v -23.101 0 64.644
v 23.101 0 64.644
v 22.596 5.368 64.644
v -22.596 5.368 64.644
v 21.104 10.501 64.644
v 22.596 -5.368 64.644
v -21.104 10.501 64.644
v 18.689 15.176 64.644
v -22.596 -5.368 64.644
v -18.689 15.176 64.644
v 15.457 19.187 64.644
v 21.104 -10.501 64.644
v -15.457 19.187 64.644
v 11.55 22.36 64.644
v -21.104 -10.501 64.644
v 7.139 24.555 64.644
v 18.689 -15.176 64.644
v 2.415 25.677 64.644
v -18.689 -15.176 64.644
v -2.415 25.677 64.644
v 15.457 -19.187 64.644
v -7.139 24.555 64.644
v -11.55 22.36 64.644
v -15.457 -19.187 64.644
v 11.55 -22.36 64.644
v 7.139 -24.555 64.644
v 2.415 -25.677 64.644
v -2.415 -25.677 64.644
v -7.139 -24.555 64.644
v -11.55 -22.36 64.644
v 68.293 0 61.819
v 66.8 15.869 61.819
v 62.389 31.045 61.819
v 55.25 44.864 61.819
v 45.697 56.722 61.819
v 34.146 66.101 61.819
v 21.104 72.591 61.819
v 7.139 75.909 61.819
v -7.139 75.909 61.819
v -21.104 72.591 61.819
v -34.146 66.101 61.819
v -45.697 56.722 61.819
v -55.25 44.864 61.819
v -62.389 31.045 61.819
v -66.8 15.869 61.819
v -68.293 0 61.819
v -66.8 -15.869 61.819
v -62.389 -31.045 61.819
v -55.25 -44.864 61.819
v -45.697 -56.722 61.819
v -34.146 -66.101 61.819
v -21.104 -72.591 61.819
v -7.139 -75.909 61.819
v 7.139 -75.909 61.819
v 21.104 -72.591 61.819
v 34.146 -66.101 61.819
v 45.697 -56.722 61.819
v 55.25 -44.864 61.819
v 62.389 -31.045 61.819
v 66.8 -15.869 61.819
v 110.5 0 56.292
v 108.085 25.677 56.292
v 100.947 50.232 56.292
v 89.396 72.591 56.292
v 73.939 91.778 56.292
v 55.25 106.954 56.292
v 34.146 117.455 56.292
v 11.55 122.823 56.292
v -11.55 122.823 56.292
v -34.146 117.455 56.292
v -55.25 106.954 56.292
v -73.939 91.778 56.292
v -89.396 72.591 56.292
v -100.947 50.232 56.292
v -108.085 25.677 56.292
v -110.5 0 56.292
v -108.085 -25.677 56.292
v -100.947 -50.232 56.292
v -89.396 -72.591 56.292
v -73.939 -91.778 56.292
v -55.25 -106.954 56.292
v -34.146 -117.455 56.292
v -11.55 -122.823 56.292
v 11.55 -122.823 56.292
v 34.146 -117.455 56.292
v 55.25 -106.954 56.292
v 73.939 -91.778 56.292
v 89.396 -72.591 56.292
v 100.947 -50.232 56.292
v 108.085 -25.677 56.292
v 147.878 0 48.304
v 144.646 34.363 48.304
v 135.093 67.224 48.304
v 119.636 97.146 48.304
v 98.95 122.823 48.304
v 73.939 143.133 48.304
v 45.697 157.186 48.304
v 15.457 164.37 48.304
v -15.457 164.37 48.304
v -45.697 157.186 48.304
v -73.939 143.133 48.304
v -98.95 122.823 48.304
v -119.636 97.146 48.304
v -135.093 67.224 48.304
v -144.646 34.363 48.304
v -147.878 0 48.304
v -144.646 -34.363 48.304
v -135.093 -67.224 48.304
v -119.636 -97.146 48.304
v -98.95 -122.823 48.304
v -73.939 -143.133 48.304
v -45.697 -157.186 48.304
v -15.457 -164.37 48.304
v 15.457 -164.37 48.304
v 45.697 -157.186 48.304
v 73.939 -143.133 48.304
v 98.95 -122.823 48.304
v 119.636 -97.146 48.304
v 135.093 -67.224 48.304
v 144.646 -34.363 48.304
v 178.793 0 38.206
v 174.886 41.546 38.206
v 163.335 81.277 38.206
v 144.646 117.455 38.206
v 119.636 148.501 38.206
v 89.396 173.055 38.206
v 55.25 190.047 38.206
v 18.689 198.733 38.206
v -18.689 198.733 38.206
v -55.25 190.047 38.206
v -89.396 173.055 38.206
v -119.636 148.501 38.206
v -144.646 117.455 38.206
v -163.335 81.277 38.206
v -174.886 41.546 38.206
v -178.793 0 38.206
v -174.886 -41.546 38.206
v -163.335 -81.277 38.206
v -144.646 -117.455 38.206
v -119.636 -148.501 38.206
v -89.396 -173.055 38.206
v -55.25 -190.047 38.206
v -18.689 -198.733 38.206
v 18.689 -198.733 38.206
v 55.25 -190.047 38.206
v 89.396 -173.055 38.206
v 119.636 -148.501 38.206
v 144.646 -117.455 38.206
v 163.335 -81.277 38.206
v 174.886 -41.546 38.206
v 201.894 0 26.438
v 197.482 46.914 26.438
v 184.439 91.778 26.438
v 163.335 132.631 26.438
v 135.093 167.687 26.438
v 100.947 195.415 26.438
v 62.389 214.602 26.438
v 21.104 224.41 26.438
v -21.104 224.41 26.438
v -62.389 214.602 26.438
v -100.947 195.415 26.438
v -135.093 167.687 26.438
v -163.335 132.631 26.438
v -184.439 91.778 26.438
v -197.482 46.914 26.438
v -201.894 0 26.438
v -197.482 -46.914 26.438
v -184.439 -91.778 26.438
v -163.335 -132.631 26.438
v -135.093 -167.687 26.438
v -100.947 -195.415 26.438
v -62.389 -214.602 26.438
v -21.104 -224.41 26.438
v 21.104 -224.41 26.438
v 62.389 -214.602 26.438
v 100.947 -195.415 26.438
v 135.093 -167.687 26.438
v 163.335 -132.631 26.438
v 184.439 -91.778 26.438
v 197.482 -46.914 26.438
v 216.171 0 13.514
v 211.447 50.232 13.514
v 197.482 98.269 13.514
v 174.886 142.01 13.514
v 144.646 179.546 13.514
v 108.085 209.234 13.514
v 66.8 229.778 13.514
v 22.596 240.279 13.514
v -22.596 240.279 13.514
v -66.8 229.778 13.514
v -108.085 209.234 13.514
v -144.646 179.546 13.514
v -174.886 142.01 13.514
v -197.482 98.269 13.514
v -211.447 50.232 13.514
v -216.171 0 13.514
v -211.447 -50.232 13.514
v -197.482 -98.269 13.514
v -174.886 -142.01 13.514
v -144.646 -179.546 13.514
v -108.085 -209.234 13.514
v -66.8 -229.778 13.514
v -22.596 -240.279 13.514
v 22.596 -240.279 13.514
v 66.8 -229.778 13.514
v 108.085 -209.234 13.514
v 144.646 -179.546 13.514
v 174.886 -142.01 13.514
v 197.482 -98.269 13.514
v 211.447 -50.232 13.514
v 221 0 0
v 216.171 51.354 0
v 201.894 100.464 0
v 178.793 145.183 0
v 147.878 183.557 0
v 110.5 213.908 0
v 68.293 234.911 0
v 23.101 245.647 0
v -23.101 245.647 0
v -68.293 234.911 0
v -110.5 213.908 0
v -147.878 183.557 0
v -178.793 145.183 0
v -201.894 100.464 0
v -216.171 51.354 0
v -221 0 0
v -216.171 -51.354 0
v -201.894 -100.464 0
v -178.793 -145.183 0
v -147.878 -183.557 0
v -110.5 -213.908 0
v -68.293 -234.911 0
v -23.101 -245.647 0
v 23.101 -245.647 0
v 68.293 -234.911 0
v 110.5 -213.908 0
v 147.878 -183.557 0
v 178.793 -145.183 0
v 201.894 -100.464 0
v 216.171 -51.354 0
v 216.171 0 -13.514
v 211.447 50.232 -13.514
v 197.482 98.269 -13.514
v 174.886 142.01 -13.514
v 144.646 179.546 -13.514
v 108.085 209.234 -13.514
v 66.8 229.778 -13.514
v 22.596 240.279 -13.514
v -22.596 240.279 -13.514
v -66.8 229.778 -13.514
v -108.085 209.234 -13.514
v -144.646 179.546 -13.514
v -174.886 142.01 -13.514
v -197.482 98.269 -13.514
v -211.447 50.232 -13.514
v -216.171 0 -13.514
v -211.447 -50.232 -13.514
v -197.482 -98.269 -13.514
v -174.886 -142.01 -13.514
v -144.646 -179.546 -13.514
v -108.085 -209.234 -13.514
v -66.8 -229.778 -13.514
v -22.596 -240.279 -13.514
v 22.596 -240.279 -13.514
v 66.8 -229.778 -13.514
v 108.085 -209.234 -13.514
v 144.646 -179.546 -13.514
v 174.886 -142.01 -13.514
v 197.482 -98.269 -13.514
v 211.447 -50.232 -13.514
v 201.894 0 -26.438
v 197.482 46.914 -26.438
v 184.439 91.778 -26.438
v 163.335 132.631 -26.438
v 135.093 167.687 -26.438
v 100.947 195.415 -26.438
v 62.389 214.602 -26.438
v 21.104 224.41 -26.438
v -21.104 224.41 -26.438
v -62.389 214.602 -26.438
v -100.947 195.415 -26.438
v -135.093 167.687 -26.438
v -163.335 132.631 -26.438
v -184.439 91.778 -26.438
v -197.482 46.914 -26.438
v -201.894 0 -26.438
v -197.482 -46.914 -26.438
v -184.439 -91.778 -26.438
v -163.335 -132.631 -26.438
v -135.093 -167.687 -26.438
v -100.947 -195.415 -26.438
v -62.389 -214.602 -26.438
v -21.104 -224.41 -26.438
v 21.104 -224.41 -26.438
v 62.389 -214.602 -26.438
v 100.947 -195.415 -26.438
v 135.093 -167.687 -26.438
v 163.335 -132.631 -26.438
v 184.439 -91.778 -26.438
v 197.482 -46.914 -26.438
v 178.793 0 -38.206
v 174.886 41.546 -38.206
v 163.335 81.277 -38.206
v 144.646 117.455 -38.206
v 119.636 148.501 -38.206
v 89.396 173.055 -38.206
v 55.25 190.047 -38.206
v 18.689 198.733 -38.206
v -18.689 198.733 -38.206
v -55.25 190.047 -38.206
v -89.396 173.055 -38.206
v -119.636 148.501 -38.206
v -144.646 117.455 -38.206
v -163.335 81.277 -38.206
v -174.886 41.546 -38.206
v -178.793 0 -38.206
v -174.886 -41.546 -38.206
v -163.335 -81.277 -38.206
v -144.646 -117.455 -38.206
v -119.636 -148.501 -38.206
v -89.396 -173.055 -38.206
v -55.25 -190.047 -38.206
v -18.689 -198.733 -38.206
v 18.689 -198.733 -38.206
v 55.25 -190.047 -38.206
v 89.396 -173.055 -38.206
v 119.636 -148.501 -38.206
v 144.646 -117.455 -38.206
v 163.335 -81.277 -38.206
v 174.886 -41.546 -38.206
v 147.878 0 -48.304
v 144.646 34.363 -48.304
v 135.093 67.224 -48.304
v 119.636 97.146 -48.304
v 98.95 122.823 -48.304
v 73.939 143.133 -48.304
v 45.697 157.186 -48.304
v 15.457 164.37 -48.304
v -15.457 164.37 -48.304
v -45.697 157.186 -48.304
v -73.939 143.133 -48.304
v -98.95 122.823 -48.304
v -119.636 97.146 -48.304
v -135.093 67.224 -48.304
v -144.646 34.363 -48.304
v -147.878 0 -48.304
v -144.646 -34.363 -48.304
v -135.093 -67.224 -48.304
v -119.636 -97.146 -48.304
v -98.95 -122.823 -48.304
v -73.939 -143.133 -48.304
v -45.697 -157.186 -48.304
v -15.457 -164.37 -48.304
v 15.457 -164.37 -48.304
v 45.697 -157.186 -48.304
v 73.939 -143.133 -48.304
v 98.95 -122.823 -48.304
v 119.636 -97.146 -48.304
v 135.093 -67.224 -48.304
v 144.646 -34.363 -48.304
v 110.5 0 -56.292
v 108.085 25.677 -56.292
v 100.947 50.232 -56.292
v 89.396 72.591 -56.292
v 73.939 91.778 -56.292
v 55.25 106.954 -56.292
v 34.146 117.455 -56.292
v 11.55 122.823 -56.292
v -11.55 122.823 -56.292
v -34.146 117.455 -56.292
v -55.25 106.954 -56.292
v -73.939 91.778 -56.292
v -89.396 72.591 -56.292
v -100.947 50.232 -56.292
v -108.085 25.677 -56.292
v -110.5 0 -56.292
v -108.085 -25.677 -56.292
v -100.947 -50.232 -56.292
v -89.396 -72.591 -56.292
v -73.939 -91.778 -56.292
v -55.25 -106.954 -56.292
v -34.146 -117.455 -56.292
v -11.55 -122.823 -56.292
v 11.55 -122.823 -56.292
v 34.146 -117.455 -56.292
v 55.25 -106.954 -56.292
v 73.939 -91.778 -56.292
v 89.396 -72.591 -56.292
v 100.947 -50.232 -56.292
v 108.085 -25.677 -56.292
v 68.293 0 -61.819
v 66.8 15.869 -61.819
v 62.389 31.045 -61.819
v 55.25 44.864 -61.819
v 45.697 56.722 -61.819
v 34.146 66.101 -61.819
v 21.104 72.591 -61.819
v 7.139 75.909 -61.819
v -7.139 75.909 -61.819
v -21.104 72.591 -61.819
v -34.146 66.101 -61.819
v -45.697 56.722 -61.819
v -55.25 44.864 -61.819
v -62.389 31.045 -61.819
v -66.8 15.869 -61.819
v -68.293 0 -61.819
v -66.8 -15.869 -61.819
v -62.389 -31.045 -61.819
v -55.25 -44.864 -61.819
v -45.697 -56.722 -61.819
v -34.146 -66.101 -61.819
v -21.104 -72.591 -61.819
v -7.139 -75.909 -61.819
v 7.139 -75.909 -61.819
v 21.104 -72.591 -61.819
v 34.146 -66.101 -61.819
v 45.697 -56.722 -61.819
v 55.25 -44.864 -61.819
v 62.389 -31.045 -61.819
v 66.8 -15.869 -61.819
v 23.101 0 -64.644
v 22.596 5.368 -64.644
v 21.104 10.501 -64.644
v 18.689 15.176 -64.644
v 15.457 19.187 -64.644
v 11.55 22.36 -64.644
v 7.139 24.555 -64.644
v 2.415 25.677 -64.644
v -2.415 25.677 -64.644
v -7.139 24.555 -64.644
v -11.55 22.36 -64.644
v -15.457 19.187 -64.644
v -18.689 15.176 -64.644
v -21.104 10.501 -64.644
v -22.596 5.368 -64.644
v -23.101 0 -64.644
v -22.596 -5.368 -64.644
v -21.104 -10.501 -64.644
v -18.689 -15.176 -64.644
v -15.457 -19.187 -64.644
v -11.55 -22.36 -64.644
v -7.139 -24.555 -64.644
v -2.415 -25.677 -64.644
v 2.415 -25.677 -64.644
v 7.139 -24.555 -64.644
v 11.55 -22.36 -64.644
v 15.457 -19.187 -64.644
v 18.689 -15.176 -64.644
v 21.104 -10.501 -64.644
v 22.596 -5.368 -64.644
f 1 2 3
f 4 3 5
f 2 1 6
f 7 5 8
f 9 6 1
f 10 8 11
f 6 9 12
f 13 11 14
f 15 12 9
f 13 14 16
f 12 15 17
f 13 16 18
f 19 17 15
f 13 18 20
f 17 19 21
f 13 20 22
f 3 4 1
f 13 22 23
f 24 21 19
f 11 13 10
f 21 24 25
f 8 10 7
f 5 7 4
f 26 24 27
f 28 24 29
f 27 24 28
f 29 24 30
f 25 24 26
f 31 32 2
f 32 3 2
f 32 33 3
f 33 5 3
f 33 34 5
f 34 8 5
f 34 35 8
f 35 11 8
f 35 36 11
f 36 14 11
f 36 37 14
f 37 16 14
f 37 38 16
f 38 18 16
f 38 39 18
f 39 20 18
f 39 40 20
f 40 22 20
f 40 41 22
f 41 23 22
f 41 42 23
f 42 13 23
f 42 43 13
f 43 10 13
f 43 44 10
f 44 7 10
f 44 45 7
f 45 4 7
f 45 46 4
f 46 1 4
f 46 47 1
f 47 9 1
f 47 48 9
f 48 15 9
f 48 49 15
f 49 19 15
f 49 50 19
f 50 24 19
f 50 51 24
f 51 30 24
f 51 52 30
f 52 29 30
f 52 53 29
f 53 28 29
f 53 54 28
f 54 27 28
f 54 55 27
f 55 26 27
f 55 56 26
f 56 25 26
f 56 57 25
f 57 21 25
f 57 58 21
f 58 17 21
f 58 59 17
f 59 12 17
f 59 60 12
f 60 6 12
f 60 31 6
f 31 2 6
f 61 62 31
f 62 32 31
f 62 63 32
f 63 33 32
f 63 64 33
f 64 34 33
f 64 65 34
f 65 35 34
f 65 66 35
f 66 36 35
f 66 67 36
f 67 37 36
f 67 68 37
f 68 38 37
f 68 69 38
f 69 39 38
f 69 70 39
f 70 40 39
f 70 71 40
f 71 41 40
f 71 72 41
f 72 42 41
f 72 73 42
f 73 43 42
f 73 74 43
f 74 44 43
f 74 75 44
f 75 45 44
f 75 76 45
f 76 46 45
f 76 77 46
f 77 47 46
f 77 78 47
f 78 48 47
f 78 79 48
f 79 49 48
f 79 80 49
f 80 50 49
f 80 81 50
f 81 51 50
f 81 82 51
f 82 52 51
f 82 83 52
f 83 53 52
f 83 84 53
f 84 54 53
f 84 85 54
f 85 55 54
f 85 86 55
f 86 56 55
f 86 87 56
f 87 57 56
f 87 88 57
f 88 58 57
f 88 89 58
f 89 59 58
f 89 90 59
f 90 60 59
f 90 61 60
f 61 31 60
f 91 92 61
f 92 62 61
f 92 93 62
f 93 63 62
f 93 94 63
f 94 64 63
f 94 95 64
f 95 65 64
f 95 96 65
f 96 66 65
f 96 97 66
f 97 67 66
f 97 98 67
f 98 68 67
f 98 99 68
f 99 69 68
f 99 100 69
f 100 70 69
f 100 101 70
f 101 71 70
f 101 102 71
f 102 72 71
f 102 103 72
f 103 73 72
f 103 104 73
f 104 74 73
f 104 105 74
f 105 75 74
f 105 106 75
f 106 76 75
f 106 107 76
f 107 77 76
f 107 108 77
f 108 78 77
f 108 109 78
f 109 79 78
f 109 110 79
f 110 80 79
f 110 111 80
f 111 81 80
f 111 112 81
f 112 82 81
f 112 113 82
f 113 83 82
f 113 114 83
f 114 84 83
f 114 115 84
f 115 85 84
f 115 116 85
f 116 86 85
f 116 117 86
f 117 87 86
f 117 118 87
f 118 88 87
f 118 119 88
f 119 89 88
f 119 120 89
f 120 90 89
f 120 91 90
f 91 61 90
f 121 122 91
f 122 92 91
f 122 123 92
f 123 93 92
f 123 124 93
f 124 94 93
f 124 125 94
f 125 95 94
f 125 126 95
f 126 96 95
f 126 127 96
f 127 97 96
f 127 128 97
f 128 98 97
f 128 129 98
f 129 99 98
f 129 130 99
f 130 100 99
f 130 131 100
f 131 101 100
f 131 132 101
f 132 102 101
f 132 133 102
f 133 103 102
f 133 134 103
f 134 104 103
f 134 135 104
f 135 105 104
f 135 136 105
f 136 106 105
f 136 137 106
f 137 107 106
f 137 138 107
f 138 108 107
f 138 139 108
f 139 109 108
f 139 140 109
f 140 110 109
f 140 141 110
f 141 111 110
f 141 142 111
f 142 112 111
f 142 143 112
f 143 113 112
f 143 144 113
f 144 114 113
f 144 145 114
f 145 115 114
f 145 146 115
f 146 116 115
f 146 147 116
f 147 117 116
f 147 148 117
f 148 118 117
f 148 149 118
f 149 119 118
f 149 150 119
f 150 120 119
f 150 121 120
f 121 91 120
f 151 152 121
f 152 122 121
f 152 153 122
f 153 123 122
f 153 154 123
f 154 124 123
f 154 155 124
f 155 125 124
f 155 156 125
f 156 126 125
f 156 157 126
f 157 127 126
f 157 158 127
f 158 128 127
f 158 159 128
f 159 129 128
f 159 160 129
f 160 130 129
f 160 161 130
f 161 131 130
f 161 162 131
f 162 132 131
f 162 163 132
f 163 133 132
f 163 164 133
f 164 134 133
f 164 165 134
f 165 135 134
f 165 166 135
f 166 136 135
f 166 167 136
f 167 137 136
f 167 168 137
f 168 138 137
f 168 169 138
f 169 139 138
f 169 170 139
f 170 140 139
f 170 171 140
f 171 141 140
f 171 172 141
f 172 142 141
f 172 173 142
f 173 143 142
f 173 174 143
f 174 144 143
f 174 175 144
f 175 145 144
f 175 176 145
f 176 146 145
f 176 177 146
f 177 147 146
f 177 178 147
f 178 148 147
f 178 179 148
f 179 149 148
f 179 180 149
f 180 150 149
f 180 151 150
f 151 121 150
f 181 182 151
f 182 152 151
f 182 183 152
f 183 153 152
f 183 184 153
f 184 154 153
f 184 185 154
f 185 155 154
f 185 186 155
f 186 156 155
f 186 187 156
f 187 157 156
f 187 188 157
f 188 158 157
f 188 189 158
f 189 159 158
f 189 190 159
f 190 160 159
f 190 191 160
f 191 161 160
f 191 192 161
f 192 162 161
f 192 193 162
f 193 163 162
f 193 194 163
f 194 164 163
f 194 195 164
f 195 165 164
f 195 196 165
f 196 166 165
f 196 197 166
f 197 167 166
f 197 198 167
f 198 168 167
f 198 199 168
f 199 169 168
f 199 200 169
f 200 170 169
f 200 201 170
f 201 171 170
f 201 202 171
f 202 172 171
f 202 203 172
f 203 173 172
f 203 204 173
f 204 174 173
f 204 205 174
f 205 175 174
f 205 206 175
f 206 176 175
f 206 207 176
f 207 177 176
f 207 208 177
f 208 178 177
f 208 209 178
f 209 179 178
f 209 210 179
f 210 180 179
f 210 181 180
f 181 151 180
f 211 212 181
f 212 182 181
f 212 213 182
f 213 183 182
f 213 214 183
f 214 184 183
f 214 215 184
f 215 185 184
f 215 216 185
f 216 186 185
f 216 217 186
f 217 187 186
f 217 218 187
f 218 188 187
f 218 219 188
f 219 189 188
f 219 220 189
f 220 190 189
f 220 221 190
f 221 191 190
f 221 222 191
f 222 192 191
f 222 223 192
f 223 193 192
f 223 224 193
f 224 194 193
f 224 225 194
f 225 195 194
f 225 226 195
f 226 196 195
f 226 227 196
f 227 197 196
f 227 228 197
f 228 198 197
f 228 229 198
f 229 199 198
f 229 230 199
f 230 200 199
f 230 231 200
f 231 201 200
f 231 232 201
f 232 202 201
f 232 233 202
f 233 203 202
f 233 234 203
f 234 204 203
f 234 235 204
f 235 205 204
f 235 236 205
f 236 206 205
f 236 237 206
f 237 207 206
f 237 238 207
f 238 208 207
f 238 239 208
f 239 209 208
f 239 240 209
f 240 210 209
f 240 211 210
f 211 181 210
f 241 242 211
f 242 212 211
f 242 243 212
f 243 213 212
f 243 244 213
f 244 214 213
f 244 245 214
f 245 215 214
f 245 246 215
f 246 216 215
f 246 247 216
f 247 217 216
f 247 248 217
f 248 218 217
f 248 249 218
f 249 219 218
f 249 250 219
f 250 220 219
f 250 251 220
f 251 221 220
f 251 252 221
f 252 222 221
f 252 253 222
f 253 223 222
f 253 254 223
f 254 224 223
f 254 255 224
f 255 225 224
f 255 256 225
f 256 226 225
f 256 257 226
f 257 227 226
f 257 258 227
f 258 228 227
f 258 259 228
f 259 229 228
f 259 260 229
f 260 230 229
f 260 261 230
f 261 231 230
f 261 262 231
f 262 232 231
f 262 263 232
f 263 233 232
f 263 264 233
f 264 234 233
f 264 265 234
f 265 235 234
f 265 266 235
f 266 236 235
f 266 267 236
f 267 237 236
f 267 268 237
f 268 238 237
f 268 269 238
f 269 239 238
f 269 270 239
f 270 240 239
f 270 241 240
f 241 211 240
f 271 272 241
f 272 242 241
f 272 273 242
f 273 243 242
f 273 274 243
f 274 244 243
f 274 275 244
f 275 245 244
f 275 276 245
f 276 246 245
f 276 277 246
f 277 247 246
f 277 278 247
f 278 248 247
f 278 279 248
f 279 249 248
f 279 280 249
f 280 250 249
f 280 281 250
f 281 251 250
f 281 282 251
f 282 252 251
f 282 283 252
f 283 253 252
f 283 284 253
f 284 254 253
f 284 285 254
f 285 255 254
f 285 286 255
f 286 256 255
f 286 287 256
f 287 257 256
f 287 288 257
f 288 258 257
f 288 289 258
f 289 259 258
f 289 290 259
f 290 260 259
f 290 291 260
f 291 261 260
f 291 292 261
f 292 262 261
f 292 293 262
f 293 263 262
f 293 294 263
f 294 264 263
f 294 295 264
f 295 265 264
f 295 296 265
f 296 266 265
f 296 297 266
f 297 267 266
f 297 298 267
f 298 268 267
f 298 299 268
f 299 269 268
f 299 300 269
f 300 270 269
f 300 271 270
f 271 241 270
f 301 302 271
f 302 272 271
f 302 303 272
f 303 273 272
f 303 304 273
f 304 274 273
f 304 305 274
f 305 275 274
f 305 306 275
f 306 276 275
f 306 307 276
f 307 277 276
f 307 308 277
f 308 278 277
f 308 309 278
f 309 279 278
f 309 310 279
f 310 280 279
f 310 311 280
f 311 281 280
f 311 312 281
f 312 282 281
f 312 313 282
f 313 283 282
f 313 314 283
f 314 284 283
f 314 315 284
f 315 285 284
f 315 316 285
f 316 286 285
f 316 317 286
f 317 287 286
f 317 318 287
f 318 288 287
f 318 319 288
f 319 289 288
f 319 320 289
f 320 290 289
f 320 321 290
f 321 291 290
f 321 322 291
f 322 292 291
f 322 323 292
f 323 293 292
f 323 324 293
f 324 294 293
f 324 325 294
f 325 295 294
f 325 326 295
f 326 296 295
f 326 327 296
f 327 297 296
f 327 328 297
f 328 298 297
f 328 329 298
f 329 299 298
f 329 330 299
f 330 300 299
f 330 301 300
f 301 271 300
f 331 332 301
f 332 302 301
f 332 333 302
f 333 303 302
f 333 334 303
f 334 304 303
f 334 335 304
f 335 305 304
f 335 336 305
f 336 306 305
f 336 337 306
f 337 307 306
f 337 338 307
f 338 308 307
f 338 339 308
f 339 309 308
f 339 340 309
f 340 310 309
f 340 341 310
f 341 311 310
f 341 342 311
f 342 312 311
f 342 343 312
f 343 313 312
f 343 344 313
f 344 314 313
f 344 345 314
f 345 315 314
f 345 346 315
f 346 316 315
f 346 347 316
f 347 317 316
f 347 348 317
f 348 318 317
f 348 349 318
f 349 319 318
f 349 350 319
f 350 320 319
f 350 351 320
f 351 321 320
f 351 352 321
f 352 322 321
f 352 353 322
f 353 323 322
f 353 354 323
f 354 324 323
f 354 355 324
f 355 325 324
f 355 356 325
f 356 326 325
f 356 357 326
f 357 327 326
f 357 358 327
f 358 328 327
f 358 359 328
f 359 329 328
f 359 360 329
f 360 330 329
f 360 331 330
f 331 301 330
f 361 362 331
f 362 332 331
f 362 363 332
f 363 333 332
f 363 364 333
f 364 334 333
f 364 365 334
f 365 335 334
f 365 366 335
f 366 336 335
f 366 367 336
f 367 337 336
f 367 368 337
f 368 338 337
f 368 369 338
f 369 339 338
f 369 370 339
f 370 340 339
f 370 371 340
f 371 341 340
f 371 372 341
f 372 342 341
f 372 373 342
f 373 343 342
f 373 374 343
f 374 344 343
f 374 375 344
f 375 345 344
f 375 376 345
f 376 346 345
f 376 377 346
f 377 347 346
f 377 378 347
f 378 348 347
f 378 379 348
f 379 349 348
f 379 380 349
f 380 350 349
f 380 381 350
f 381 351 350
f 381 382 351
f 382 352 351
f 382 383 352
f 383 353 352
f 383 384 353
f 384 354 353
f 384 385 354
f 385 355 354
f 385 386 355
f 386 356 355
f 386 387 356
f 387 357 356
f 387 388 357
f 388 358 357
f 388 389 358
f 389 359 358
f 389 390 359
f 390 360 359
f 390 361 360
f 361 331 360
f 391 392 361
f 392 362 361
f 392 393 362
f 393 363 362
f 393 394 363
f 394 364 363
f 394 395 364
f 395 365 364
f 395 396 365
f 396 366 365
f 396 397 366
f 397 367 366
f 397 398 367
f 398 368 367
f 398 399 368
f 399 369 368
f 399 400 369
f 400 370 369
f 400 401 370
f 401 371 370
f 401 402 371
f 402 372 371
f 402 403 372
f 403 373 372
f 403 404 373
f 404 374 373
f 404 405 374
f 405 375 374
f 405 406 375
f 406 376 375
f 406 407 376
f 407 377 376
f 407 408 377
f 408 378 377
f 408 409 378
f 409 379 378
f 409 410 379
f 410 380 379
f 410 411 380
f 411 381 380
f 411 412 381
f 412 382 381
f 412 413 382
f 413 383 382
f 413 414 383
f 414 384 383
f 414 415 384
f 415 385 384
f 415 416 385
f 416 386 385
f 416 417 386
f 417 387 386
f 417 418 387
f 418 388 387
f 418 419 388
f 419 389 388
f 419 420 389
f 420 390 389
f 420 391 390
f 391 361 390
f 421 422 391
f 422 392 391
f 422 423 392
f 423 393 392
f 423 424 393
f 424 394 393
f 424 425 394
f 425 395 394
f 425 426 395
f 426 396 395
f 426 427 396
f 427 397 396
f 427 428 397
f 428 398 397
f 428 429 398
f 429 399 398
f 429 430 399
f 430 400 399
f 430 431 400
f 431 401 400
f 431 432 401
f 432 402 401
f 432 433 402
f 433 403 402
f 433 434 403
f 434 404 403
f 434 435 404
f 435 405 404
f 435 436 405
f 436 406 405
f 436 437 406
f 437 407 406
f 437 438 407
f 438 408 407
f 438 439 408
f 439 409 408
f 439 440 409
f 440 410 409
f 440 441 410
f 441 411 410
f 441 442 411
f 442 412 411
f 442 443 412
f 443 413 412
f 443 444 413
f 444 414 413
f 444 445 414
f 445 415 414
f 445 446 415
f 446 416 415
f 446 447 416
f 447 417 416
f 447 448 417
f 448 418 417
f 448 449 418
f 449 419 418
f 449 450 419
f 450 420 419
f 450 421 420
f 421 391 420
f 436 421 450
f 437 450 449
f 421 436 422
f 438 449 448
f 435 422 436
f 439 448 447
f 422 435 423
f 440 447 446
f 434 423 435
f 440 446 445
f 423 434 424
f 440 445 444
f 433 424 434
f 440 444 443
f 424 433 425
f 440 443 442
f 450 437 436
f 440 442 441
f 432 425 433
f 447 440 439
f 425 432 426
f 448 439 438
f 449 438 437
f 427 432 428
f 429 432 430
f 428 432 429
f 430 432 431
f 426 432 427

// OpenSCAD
// Generated by SolidPython 1.0.1 on 2020-07-29 00:46:53


scale(v = [17, 19, 5]) {
	sphere(r = 13);
}
/***********************************************
*********      SolidPython code:      **********
************************************************
 
# import packages: SolidPython
from solid import *
from solid.utils import *
from itertools import chain, combinations, permutations


class Resize:

    def __init__(self, scad_file):
        self.scad_file = scad_file
        #self.scad_file = import_scad(scad_file)
        # cone/cylinder param:
        self.r1 = 0
        self.r2 = 0
        self.h = 0
        # rectangular prism param:
        self.w = 0
        self.l = 0
        # ellipse param:
        self.r = 0

    # import OpenScad code (file name corresponds to shape)


    # classify shape + parameters
    def assign(self, param1, param2, param3):
        if self.scad_file == 'cone.scad':
            self.r1 = param1
            self.r2 = param2
            self.h = param3
        elif self.scad_file == 'cylinder.scad':
            self.r1 = param1
            self.r2 = param2
            self.h = param3
        elif self.scad_file == 'rectangularPrism.scad':
            self.h = param1
            self.l = param2
            self.w = param3
        else:
            self.r = param1
            self.h = param2

    # resize parameters
    def iterate(self):
        x = range(3, 20, 2)
        i = 1
        if self.scad_file == 'cone.scad':
            tempList = list(permutations(x, 2))
            for temp in tempList:
                param1 = temp[0]
                param2 = temp[1]
                filepath = 'produced_scad_files/' + 'cone' + str(param1) + '_' + str(param2) + '_' + '.scad'
                scad_render_to_file(cylinder(h=param1, r1=param2, r2=0), filepath)

        elif self.scad_file == 'cylinder.scad':
            tempList = list(permutations(x, 3))
            for temp in tempList:
                param1 = temp[0]
                param2 = temp[1]
                filepath = 'produced_scad_files/' + 'cylinder' + str(param1) + '_' + str(param2) + '_' + '.scad'
                scad_render_to_file(cylinder(h=param1, r1=param2, r2=param2), filepath)

        elif self.scad_file == 'rectangularPrism.scad':
            tempList = list(permutations(x, 3))
            for temp in tempList:
                param1 = temp[0]
                param2 = temp[1]
                param3 = temp[2]
                filepath = 'produced_scad_files/' + 'rectangularPrism' + str(param1) + '_' + str(param2) + '_' + str(
                    param3) + '.scad'
                scad_render_to_file(cube(size=(param1, param2, param3)), filepath)

        elif self.scad_file == 'ellipse.scad':
            tempList = list(permutations(x, 4))
            for temp in tempList:
                param1 = temp[0]
                param2 = temp[1]
                param3 = temp[2]
                param4 = temp[3]
                filepath = 'produced_scad_files/' + 'ellipse' + str(param1) + '_' + str(param2) + '_' + str(param3) + '_' + str(param4) + '.scad'
                scad_render_to_file(scale([param1, param2, param3])(sphere(r=param4)), filepath)

    def render_to_scadfile(self):
        scad_render_to_file(scad, 'example.scad') 
 
************************************************/
